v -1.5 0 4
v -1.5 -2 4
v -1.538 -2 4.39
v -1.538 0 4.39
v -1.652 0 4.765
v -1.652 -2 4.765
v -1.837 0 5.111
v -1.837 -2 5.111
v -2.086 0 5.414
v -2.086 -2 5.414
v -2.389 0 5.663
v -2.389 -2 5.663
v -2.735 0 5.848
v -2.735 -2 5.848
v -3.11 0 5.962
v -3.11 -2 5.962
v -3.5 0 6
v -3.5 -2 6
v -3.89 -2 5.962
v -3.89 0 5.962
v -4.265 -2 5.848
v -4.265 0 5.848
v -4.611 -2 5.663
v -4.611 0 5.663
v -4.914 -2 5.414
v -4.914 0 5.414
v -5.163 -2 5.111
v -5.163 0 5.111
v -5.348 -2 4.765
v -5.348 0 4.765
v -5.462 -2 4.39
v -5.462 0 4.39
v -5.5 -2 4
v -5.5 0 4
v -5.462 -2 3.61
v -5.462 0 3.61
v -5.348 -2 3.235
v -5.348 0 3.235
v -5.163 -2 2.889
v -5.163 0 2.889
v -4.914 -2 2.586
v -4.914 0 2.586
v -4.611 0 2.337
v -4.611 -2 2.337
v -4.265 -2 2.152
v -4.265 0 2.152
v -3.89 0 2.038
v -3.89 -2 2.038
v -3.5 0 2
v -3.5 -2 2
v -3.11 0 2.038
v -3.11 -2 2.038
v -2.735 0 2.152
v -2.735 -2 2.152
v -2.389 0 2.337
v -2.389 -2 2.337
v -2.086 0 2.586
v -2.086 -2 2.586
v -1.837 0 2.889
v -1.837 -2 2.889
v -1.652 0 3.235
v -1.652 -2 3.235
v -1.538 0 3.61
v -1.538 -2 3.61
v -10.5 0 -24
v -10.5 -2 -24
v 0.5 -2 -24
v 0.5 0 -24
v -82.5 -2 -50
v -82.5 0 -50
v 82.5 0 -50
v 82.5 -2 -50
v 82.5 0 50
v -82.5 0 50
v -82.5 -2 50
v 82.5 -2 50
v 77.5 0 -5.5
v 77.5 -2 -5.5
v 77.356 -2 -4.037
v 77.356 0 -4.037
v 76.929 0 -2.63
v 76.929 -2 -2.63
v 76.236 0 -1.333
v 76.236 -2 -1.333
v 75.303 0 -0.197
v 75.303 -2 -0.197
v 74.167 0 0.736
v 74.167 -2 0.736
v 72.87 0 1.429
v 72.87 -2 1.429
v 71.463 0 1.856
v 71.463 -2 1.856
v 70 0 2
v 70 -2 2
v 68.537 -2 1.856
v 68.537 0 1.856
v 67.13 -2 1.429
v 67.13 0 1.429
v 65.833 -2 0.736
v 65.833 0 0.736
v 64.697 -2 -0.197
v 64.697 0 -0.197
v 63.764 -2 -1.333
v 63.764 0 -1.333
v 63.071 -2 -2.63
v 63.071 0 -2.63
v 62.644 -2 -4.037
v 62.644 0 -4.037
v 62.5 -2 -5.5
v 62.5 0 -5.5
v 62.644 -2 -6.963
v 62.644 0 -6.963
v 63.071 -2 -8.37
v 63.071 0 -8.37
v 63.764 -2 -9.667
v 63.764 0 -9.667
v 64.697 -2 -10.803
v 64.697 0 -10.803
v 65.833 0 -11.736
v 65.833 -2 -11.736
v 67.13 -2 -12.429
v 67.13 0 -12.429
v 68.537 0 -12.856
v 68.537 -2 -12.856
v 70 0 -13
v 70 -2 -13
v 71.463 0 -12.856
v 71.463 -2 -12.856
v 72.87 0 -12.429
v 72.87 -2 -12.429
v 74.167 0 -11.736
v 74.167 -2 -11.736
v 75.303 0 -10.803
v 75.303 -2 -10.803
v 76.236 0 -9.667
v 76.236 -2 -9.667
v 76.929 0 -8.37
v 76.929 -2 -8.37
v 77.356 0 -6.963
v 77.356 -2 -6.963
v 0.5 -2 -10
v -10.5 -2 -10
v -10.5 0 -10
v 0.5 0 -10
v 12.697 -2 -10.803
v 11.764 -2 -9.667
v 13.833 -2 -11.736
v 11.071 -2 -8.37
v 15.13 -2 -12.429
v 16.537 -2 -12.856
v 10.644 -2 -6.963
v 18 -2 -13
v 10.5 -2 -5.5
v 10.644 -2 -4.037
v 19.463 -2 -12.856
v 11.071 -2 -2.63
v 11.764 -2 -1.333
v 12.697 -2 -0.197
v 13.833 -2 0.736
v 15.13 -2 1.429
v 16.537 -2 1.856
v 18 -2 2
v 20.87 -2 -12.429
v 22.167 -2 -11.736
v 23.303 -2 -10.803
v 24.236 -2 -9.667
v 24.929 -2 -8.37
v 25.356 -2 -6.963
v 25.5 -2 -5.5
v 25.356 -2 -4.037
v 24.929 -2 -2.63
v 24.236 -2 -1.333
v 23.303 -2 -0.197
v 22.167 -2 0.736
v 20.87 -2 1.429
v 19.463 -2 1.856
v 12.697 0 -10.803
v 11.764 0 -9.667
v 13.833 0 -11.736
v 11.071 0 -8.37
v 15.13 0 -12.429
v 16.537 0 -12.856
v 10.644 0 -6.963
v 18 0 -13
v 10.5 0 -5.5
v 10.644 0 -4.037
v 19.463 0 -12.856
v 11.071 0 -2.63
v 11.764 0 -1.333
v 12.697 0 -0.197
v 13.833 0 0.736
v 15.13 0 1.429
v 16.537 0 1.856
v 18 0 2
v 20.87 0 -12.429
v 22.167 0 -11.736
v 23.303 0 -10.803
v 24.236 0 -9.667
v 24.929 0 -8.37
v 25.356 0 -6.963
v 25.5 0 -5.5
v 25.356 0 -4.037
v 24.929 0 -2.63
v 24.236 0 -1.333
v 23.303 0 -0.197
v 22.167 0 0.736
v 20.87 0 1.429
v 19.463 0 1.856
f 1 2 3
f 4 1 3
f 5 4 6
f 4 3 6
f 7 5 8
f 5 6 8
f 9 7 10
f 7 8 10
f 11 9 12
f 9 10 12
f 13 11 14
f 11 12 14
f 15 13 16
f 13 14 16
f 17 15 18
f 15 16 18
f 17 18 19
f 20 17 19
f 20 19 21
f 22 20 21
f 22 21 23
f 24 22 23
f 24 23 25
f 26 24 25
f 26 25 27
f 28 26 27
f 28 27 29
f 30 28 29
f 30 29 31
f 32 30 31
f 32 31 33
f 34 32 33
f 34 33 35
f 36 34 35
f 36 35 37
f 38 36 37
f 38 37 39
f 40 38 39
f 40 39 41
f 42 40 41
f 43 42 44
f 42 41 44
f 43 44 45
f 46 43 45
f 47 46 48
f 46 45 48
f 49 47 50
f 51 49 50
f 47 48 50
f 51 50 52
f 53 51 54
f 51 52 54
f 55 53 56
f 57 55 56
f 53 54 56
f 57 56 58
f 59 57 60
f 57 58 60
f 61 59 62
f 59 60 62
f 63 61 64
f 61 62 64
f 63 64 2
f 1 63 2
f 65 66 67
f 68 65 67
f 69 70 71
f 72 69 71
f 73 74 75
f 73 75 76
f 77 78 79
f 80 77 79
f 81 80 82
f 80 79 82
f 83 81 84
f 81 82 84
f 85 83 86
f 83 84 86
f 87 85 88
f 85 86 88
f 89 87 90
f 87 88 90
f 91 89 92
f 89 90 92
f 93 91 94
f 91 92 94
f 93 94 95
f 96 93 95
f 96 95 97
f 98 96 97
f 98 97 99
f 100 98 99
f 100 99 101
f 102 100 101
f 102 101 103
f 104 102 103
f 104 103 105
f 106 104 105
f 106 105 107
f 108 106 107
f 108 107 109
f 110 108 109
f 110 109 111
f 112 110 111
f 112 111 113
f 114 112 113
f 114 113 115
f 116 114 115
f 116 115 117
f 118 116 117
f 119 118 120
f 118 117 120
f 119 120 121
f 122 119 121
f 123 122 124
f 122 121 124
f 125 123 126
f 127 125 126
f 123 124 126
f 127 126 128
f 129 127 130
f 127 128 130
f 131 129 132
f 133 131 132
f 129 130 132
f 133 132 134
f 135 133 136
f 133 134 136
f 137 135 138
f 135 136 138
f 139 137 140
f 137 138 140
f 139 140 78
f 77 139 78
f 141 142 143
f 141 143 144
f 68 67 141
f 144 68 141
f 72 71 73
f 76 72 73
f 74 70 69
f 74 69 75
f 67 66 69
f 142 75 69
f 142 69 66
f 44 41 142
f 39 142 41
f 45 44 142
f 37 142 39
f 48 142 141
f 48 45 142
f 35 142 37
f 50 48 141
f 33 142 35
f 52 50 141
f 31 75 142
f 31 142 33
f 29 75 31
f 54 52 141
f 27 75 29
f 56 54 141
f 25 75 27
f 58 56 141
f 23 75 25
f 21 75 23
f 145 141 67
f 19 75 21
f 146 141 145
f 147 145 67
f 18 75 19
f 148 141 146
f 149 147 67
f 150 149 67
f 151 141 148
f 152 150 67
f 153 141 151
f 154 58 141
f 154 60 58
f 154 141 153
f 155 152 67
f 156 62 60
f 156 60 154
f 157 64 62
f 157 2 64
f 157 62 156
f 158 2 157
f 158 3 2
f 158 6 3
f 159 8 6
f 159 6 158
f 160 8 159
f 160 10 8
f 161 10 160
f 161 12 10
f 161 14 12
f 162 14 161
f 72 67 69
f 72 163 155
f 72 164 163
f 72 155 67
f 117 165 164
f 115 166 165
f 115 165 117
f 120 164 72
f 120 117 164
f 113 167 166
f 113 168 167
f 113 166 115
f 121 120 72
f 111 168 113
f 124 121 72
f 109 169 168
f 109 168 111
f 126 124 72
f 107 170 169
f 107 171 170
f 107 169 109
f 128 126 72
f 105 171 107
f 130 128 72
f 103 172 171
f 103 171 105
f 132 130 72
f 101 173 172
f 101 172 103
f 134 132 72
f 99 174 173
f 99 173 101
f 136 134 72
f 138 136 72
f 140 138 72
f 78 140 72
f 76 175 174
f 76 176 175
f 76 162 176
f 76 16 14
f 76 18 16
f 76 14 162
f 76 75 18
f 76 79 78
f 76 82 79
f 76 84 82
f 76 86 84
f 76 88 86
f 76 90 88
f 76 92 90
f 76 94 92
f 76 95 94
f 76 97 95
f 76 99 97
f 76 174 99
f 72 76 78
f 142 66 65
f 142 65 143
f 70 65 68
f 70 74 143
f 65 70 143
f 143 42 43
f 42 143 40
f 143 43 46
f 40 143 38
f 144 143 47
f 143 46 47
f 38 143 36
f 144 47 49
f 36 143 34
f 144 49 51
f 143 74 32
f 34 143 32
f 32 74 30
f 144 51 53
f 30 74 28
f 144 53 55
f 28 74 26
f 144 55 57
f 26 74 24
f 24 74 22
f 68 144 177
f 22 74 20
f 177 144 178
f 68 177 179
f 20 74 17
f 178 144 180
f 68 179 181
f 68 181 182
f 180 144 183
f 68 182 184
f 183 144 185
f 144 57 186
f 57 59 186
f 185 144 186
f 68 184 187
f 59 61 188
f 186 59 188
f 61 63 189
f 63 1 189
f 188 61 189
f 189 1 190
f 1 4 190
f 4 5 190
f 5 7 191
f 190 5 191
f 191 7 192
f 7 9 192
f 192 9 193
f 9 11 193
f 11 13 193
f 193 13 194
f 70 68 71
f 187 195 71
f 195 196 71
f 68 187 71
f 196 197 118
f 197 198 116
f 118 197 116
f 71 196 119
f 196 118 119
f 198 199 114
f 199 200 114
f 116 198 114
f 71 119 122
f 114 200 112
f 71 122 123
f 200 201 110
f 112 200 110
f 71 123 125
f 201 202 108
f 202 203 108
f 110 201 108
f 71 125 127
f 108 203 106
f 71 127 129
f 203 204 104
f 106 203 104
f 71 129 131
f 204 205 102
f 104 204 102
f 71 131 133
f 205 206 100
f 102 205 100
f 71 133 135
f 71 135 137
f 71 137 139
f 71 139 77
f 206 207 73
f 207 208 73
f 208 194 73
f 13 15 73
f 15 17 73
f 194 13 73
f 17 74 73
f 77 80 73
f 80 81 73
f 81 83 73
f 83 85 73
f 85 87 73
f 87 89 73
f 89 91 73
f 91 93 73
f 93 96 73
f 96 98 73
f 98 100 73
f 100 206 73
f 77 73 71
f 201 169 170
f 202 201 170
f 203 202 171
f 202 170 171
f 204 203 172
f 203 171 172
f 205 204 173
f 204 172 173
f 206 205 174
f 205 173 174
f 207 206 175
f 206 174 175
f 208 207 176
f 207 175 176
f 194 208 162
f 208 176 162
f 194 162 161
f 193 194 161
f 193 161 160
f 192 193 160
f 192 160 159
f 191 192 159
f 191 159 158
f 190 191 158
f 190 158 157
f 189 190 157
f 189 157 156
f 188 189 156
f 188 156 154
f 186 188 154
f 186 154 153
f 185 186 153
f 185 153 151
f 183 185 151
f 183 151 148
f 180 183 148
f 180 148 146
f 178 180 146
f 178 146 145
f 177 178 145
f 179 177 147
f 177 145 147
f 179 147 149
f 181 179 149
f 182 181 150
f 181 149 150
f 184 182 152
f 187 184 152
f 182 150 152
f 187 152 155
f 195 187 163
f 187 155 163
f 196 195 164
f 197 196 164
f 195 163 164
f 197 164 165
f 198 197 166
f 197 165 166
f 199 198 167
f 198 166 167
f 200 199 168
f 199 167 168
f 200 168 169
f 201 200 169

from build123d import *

# Parameters (mm, degrees)
F0_W     = 165
F0_H     = 100
F1_DEPTH = 2
F2_W     = 11
F2_H     = 14
F2_R     = 2
F2_R_2   = 7.5
F3_DEPTH = 25


with BuildPart() as f1:
    # F0 (on Front) → F1 (new body)
    with BuildSketch(Plane.XZ):
        Rectangle(F0_W, F0_H)
    extrude(amount=F1_DEPTH)

    # F2 (on face) → F3 (cut)
    with BuildSketch(Plane.XZ.offset(2)):
        with Locations((-5, -17)):
            Rectangle(F2_W, F2_H)
        with Locations((-3.5, 4)):
            Circle(F2_R)
        with Locations((18, -5.5)):
            Circle(F2_R_2)
        with Locations((70, -5.5)):
            Circle(F2_R_2)
    extrude(amount=-F3_DEPTH, mode=Mode.SUBTRACT)


solid = f1.part
